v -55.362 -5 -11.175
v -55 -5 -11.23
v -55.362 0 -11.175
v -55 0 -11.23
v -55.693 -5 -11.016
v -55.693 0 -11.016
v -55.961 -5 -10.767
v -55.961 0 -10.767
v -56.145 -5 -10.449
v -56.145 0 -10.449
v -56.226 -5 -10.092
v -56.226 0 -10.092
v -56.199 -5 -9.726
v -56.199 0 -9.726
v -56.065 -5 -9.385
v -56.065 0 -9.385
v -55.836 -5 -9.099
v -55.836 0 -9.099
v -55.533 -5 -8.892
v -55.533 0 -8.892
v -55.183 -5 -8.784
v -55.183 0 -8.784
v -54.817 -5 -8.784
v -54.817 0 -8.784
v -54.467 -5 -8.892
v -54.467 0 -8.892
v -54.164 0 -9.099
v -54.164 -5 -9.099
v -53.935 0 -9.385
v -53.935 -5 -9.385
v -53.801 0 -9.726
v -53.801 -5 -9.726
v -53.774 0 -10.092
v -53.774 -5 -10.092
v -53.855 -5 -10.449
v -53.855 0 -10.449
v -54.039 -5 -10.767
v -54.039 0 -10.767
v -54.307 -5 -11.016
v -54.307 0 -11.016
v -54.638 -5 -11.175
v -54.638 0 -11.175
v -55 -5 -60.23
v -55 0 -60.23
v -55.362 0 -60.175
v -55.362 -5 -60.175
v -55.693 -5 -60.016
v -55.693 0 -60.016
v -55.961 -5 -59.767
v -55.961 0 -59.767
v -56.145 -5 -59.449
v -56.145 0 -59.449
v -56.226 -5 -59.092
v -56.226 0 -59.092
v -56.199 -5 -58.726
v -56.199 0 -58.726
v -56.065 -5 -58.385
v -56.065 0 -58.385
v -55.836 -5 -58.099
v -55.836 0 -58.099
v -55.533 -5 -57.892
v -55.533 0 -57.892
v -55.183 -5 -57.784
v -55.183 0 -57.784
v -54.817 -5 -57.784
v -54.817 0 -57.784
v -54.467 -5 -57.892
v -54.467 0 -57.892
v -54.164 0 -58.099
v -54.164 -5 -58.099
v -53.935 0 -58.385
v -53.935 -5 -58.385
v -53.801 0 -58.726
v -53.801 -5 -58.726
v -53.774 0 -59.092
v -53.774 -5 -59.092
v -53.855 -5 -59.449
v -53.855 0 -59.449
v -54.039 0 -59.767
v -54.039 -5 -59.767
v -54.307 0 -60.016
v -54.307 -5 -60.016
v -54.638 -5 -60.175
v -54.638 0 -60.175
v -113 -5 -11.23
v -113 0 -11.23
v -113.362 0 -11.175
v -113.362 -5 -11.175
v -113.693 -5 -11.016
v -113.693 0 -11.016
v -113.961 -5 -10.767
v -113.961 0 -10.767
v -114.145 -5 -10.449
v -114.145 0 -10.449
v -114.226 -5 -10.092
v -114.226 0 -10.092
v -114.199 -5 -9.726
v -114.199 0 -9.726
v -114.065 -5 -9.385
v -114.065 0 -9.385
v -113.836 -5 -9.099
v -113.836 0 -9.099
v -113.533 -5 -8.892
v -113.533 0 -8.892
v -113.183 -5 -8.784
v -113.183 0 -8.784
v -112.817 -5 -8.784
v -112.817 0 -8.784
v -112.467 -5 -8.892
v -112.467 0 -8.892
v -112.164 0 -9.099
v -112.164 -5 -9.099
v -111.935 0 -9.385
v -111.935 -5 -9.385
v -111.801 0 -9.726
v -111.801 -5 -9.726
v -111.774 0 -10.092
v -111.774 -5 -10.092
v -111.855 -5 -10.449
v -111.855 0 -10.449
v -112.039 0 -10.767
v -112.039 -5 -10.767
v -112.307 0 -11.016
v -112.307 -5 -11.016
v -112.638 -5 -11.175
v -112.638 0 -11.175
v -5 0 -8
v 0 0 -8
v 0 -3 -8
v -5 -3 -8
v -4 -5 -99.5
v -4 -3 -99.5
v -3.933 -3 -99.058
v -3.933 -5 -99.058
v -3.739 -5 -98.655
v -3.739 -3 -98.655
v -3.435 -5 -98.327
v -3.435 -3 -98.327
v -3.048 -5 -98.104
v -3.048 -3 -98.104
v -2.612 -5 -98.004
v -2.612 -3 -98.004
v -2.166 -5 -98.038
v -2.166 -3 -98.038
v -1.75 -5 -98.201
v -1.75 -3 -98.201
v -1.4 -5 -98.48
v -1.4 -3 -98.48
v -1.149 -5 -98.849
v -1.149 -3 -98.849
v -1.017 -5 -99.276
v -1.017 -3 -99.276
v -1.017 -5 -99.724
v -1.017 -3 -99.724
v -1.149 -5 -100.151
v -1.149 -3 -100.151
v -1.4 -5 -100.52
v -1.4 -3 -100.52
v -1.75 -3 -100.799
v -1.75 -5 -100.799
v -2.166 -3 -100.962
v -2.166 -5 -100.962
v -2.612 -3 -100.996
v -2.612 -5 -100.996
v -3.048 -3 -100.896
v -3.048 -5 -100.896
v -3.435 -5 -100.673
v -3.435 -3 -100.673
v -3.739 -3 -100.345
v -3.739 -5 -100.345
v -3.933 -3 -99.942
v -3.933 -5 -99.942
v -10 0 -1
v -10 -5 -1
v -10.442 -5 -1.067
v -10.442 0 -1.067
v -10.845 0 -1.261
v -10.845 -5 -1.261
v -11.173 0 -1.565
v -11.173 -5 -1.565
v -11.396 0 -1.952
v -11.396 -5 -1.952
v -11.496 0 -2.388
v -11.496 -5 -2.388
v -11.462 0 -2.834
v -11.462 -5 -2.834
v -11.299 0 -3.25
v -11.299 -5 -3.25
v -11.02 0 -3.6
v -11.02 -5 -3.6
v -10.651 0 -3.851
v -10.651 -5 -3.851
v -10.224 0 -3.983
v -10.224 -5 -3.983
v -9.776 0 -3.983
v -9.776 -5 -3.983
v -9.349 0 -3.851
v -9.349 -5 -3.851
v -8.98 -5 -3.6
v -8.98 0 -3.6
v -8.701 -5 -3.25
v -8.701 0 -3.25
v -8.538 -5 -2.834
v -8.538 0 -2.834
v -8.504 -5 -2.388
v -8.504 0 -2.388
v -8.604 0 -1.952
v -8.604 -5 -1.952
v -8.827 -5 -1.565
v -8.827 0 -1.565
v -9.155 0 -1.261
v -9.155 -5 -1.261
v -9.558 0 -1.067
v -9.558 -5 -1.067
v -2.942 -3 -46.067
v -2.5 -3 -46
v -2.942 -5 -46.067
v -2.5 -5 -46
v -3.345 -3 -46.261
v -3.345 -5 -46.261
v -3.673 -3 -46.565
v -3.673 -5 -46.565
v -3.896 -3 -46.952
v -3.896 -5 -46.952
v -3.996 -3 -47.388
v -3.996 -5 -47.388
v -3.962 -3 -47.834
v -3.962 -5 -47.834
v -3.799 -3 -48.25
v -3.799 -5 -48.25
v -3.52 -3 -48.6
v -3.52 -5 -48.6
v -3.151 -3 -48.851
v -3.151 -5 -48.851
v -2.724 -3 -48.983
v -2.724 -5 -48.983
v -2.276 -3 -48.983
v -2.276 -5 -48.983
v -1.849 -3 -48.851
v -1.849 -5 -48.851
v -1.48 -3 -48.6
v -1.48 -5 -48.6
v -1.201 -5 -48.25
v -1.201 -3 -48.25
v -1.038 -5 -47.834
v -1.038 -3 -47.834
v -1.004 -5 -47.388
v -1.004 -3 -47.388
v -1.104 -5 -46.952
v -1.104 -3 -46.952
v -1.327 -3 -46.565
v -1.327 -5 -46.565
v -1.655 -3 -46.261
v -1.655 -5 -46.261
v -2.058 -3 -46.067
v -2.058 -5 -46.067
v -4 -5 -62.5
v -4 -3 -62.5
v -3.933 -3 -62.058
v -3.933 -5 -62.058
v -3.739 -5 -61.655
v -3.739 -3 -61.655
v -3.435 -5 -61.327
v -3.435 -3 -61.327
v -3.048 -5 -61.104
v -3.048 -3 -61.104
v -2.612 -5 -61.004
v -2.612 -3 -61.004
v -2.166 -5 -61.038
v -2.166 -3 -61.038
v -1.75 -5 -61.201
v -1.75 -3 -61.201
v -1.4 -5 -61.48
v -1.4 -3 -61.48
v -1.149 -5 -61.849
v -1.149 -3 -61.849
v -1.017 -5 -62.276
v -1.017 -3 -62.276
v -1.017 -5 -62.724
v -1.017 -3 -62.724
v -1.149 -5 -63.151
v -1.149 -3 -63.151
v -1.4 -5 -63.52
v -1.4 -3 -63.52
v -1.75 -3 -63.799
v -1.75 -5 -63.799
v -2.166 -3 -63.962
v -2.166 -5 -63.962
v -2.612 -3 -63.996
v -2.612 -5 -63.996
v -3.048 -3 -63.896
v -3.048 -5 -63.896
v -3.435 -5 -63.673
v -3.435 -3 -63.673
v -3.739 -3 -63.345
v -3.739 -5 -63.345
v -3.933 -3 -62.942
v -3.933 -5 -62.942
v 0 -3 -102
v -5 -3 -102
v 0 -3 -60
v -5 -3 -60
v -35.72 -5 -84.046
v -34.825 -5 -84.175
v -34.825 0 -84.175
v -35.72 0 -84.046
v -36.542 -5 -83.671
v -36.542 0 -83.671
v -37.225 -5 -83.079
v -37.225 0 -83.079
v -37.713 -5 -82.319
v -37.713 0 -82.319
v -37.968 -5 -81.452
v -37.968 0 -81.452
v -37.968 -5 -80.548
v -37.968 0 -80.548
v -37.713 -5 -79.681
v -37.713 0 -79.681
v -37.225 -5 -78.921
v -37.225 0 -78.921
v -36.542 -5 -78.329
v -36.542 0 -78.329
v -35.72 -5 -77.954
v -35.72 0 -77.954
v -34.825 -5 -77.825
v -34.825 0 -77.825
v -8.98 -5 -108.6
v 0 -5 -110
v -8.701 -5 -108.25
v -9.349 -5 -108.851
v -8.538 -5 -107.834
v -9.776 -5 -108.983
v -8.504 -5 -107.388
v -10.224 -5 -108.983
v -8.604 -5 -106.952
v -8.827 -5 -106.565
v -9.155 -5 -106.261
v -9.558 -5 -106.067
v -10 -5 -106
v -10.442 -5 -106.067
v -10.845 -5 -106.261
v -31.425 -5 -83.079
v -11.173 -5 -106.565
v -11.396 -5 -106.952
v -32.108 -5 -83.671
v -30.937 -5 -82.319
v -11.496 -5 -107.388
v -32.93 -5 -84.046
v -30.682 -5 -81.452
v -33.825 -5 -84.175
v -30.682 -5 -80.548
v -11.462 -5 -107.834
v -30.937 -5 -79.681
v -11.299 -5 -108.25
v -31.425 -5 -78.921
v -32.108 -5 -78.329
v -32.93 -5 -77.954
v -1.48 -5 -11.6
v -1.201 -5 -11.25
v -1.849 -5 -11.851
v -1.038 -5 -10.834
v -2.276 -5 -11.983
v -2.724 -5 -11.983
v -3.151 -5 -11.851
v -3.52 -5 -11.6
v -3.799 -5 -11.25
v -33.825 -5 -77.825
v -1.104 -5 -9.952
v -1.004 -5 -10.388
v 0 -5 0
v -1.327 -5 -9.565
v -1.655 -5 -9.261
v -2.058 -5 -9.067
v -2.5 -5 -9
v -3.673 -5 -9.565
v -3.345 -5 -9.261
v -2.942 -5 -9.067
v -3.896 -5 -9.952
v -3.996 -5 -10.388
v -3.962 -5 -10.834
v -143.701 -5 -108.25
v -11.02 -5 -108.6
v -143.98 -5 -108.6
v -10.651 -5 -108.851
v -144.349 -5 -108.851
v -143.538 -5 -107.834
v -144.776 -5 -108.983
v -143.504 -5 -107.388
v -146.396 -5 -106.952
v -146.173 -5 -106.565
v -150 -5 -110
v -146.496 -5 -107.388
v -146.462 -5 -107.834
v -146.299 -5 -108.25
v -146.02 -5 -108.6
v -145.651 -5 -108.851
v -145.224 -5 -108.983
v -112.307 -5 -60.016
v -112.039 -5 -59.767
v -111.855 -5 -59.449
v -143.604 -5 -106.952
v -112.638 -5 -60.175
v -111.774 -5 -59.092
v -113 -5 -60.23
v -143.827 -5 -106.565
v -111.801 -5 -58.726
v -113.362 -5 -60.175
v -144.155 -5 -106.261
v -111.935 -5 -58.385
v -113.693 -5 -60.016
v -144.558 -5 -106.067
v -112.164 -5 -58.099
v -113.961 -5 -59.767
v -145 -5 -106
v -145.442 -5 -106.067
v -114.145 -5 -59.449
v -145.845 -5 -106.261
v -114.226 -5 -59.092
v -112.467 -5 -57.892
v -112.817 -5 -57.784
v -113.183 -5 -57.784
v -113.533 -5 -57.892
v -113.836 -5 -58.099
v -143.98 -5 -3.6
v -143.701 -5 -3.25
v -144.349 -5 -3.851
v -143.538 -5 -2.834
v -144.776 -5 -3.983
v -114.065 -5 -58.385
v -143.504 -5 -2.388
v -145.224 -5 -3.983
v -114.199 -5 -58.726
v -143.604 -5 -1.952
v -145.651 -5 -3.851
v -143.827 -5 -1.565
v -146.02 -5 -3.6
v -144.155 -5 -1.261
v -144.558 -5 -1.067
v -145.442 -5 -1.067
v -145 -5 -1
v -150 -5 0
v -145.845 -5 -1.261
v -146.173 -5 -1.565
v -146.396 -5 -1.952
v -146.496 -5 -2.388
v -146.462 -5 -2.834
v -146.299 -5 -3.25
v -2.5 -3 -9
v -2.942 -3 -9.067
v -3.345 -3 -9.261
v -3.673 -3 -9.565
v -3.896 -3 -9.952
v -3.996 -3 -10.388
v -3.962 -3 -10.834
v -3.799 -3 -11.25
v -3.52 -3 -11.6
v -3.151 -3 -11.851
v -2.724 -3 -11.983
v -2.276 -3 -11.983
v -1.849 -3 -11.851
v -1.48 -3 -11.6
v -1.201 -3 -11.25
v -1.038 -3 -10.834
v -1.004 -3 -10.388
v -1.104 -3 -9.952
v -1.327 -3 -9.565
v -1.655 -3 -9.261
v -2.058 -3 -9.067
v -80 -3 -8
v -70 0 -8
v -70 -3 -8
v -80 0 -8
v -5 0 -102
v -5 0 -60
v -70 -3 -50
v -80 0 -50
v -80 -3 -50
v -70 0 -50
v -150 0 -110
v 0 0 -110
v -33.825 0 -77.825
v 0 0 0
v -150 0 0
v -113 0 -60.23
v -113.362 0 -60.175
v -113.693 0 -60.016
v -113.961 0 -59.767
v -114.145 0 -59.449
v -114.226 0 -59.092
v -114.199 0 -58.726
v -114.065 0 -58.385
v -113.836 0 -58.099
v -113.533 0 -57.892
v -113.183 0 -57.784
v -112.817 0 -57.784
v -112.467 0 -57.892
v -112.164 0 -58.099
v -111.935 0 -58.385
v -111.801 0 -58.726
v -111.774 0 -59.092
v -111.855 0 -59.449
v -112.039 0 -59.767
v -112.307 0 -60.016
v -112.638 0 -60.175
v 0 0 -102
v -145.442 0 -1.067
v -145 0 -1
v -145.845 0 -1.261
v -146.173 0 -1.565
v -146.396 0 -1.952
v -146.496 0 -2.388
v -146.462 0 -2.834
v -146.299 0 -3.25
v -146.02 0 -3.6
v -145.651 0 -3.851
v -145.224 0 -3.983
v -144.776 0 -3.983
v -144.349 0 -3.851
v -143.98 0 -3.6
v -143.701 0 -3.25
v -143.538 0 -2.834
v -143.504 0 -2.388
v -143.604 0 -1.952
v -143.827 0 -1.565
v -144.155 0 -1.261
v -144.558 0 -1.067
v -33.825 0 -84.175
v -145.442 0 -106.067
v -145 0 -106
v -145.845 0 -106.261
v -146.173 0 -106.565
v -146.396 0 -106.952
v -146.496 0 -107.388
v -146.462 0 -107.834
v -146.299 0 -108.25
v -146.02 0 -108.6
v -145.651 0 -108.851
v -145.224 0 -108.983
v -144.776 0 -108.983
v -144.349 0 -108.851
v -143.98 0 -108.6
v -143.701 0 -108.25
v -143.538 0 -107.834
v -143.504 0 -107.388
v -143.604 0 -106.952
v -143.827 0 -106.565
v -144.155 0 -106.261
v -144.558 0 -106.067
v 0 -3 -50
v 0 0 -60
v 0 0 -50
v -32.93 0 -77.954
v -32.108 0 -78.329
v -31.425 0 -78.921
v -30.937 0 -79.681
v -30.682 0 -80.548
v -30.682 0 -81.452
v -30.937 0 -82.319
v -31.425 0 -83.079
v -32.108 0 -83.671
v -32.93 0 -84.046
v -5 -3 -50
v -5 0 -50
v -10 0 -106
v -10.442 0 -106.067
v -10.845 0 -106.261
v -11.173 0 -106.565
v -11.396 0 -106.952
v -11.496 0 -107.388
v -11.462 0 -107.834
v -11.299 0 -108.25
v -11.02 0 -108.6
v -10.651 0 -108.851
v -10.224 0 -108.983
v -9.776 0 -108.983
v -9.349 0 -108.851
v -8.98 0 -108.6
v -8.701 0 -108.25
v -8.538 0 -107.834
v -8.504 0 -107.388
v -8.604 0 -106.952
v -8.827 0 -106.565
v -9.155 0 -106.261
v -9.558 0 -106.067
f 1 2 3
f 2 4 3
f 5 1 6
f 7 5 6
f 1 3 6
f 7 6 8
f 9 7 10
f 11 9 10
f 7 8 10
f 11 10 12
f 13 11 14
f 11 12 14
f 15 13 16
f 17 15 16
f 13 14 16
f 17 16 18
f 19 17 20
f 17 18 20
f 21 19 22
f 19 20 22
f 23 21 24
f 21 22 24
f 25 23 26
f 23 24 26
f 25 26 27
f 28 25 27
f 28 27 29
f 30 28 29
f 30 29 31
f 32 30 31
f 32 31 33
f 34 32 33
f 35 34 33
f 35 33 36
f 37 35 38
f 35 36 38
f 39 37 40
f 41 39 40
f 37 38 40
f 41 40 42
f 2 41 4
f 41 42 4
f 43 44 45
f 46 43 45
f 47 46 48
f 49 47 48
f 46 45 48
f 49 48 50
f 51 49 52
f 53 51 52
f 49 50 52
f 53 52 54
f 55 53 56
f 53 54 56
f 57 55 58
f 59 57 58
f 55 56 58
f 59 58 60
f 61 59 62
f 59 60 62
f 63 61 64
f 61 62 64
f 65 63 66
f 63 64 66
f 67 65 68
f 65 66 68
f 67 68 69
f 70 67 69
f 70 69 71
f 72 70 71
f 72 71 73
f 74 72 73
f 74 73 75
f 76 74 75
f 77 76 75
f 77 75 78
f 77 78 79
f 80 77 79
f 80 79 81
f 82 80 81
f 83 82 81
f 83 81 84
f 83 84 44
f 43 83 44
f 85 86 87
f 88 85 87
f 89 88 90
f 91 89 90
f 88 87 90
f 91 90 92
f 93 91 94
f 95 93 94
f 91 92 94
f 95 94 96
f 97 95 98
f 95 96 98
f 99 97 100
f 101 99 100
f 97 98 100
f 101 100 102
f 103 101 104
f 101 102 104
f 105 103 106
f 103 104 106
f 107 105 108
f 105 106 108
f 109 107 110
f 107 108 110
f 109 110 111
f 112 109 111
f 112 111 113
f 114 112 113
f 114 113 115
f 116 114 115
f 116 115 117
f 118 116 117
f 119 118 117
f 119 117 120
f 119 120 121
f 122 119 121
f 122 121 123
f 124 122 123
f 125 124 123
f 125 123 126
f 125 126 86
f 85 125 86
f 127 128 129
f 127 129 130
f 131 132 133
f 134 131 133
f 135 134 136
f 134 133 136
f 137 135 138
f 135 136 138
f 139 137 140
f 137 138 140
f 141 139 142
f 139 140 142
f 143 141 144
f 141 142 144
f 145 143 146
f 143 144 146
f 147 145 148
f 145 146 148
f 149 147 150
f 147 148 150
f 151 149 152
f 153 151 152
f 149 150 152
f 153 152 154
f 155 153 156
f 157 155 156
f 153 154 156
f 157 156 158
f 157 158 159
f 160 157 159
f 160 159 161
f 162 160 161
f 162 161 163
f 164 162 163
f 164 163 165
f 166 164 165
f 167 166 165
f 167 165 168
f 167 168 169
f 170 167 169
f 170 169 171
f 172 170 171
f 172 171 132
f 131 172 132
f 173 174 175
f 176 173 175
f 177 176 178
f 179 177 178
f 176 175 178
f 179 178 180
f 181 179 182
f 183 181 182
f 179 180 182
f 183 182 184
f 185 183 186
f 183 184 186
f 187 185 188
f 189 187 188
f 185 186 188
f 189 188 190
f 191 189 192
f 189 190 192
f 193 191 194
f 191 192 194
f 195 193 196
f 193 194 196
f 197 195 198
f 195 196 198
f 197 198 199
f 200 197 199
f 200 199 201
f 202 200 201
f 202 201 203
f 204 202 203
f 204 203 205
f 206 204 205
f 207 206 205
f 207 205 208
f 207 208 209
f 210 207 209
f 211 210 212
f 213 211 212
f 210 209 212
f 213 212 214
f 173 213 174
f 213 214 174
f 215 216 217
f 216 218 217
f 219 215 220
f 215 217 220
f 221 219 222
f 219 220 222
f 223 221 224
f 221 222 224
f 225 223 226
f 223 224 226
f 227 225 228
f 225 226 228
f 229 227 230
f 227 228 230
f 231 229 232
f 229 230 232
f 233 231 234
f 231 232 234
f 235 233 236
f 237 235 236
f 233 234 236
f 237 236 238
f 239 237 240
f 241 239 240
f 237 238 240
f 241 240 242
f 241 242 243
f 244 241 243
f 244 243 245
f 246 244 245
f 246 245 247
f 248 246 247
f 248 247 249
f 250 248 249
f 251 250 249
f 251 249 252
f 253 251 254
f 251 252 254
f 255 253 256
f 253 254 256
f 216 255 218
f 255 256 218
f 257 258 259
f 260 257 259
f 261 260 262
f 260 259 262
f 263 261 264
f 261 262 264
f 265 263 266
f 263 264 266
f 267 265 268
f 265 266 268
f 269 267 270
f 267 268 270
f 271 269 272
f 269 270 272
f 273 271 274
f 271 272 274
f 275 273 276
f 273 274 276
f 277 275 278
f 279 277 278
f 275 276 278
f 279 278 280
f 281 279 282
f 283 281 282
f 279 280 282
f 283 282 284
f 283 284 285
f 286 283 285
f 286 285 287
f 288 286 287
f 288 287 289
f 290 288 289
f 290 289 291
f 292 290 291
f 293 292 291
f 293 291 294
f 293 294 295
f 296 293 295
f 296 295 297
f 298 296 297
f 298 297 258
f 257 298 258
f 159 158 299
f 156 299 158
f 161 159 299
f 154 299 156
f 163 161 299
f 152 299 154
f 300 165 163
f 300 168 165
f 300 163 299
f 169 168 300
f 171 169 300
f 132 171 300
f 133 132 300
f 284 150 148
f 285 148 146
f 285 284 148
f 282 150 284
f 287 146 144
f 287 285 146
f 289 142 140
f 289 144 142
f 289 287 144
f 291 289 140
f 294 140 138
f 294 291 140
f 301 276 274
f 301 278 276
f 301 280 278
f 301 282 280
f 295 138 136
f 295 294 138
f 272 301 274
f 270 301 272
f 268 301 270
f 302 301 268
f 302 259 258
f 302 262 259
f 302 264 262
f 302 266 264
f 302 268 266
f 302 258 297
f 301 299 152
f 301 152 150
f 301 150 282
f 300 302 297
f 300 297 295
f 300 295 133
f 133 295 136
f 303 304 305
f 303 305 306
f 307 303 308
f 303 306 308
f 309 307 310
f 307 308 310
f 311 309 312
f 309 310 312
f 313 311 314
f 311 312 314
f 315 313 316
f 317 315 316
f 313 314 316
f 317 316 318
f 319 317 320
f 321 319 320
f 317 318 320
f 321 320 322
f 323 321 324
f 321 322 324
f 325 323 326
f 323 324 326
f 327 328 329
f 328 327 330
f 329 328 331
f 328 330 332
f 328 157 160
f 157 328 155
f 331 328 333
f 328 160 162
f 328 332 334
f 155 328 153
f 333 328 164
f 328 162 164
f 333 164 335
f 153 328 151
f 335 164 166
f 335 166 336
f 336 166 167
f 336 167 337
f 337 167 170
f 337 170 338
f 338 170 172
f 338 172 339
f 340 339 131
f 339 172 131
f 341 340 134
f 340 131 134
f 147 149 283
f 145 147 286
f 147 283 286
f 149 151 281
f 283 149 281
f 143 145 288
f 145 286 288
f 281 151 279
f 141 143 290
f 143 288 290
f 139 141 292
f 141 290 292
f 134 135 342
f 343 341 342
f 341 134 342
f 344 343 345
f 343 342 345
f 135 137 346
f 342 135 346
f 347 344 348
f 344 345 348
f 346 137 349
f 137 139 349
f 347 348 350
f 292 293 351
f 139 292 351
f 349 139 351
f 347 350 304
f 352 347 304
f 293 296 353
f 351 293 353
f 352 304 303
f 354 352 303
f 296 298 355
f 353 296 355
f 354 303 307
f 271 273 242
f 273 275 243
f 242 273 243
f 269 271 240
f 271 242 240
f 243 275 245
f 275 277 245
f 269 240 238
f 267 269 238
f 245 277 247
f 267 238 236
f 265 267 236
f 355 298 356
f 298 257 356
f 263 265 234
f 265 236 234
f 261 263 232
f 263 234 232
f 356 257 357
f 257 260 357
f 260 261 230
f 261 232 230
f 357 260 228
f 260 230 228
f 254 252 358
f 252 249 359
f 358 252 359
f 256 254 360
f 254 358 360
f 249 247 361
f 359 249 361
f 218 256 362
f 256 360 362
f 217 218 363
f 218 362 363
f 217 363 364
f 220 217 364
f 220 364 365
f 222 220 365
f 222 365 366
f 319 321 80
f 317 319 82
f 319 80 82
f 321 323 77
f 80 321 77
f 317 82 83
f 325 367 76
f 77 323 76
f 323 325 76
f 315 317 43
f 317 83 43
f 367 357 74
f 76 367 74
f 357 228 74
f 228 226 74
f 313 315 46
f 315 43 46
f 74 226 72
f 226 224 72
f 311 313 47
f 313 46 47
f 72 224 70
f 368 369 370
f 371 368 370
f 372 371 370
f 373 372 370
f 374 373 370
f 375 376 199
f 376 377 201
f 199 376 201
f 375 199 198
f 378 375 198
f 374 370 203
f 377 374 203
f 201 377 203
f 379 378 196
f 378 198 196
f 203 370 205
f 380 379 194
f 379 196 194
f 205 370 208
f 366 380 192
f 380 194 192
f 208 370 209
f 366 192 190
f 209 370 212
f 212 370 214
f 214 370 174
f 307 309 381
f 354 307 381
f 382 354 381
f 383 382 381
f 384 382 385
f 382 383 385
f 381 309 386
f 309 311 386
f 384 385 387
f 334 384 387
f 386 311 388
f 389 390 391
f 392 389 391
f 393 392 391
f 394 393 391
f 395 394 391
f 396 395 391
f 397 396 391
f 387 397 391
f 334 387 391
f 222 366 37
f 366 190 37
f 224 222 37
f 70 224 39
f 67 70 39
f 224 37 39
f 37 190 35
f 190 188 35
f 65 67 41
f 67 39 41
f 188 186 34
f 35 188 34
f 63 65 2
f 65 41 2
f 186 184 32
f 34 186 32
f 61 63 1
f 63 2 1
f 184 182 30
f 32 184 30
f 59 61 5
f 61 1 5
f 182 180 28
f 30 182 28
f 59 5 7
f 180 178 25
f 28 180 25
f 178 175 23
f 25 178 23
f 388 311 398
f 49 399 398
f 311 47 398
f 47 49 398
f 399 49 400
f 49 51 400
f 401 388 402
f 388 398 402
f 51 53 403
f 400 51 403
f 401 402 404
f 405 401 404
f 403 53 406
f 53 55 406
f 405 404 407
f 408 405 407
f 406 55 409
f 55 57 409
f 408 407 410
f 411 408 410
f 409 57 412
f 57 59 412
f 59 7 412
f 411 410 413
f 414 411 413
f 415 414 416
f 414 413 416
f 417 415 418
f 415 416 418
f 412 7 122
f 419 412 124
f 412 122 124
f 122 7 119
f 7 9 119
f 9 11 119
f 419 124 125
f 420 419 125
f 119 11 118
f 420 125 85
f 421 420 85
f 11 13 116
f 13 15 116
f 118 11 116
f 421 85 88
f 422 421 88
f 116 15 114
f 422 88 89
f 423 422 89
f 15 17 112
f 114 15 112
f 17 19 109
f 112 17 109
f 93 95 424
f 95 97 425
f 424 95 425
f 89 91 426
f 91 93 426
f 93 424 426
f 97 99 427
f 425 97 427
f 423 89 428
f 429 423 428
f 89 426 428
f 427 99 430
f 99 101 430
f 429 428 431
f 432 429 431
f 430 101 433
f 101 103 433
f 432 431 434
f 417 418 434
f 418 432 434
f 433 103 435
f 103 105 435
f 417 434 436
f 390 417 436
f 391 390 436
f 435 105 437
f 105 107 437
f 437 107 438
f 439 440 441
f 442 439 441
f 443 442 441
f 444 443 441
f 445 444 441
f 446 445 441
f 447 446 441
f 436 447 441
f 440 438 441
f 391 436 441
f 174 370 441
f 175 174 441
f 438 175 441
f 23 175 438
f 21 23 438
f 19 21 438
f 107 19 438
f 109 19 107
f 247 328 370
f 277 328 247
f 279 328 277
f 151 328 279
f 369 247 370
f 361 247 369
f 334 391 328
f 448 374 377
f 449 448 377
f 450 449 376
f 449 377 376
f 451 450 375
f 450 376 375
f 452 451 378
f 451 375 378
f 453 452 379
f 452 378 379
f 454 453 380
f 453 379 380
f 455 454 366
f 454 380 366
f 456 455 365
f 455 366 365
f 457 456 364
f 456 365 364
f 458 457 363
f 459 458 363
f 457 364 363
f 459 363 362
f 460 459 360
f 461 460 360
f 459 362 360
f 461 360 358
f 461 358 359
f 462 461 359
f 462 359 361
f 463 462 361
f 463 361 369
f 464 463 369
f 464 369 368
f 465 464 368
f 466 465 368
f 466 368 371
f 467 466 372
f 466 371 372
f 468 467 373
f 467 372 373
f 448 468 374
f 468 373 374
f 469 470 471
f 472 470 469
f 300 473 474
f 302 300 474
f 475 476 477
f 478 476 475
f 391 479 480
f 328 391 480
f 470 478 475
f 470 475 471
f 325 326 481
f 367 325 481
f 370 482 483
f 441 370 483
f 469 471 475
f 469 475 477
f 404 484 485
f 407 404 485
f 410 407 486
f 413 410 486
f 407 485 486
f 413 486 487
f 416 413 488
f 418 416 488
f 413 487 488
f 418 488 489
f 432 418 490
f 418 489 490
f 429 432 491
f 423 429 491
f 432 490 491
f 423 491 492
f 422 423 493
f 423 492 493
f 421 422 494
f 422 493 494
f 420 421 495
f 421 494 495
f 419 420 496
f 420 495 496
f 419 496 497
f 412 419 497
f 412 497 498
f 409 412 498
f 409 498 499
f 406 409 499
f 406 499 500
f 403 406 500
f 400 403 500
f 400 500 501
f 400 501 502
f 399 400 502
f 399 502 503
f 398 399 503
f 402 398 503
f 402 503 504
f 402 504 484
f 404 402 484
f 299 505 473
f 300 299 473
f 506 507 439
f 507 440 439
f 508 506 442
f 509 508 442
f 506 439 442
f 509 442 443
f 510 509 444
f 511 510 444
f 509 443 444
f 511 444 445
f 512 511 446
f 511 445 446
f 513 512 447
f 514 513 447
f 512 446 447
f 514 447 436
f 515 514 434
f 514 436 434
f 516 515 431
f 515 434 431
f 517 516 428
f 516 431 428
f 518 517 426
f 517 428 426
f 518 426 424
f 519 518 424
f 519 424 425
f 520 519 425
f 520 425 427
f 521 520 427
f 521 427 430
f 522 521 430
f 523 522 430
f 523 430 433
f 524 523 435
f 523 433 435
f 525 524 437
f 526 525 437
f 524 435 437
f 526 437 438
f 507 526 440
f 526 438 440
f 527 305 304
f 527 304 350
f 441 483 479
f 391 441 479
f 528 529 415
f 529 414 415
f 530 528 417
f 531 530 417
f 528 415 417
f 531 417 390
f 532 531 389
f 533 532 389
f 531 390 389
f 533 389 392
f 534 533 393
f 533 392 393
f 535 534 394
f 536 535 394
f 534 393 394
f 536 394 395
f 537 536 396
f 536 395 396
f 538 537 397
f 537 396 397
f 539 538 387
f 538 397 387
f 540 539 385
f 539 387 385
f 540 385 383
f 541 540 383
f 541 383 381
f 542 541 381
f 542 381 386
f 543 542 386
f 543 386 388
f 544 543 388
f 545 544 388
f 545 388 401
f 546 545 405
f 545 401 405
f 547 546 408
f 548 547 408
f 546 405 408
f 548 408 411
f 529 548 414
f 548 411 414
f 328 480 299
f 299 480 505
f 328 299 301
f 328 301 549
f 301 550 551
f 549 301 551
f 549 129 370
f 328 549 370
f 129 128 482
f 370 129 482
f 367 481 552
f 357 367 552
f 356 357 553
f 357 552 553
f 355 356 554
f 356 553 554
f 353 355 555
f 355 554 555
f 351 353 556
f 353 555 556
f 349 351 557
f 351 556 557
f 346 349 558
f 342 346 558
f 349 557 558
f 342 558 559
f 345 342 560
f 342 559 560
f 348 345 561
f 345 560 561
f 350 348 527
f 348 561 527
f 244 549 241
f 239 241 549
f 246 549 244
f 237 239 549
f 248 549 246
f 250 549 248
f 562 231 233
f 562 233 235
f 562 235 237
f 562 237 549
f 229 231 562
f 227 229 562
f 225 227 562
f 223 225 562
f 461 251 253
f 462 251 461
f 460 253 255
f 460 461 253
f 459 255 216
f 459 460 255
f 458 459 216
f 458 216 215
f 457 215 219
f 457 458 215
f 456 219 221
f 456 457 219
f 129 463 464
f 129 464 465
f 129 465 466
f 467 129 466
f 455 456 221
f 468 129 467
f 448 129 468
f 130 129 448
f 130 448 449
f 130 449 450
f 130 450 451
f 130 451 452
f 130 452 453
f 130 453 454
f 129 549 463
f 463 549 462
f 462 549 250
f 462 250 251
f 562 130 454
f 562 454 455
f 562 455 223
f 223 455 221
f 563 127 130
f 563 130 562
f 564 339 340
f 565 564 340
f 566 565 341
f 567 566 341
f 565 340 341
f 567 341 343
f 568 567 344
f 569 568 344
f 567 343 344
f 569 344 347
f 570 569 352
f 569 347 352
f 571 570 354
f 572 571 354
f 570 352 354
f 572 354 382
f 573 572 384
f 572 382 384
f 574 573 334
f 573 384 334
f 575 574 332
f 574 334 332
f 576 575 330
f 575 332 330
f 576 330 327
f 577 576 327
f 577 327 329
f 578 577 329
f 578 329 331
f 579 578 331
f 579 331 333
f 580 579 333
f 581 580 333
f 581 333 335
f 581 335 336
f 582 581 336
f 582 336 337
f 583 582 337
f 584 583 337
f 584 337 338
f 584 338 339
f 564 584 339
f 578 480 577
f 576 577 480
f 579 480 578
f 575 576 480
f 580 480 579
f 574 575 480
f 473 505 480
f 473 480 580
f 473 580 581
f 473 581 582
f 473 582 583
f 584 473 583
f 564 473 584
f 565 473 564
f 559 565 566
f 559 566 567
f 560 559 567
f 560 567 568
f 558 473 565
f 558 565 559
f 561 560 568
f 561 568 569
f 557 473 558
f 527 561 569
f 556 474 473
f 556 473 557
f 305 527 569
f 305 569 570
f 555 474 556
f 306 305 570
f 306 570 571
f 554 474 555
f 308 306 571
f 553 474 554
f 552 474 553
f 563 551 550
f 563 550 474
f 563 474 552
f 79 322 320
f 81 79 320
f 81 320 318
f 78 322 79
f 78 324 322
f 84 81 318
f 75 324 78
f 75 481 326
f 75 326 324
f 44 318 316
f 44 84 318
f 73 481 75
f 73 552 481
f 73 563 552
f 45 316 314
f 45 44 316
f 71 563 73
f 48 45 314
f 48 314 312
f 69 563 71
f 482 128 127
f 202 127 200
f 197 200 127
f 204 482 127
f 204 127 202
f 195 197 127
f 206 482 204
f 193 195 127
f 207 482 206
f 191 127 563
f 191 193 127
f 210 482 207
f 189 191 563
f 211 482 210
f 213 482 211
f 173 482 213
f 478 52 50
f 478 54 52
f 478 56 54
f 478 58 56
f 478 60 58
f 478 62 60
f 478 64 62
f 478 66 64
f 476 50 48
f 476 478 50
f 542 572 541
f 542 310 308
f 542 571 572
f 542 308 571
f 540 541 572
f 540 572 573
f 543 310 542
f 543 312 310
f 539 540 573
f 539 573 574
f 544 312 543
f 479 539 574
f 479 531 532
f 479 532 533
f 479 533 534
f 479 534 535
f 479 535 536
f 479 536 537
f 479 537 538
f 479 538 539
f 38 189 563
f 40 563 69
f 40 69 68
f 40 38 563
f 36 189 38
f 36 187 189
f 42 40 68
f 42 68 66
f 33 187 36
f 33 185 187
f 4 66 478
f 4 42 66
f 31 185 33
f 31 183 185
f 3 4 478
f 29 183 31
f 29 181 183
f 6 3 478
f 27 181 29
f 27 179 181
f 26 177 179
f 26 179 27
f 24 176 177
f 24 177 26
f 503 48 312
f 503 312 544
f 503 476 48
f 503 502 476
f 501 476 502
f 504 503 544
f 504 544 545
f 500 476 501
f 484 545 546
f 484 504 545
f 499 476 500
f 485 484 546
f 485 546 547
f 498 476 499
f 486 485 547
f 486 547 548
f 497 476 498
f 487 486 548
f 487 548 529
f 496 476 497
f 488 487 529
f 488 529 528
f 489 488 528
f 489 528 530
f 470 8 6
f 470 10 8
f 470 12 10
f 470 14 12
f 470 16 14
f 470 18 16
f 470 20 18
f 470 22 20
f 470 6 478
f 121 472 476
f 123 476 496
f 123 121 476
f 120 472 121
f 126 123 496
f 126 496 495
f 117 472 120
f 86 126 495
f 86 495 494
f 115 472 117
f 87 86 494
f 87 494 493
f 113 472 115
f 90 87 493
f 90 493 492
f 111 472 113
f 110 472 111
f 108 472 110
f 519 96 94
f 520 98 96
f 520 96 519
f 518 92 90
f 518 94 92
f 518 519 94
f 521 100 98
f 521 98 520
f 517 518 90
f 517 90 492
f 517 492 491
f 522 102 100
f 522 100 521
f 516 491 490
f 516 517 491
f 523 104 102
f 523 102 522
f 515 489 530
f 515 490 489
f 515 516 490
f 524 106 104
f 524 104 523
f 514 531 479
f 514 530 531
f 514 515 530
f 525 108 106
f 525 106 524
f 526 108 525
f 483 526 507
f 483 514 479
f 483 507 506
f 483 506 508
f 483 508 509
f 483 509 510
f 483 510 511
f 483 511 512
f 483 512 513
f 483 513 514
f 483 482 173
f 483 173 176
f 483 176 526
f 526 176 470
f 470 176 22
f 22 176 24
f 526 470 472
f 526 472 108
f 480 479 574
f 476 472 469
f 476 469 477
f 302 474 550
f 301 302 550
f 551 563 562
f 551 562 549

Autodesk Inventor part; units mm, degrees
ref_plane "YZ Plane" through (0, 0, 0) normal (1, 0, 0) x (0, 1, 0)
ref_plane "XZ Plane" through (0, 0, 0) normal (0, 1, 0) x (-1, 0, 0)
ref_plane "XY Plane" through (0, 0, 0) normal (0, 0, 1) x (1, 0, 0)
sketch "Sketch1" plane through (0, 0, 0) normal (0, 1, 0) x (-1, 0, 0)
  line L0 (0, 0) -> (150, 0)
  line L1 (150, 0) -> (150, -110)
  line L2 (150, -110) -> (0, -110)
  line L3 (0, -110) -> (0, 0)
  line L4 (40, -60) -> (0, -60)
  line L5 (0, -60) -> (0, -102)
  line L6 (0, -102) -> (40, -102)
  line L7 (40, -102) -> (40, -60)
  circle A0 centre (2.5, -62.5) radius 1.5
  circle A1 centre (2.5, -99.5) radius 1.5
  circle A2 centre (34.825, -81) radius 3.175
  circle A3 centre (33.825, -81) radius 3.175
  line L8 (34.825, -77.825) -> (33.825, -77.825)
  line L9 (34.825, -84.175) -> (33.825, -84.175)
  line L10 (37, -77.825) -> (37, -84.175) construction
  line L11 (25, -96) -> (0, -96)
  line L12 (0, -96) -> (0, -66)
  line L13 (0, -66) -> (25, -66)
  line L14 (25, -66) -> (25, -96)
  line L15 (5, -102) -> (5, -96)
  line L16 (5, -66) -> (5, -60)
  line L17 (5, -50) -> (0, -50)
  line L18 (0, -50) -> (0, -8)
  line L19 (0, -8) -> (5, -8)
  line L20 (5, -8) -> (5, -50)
  line L21 (5, -96) -> (5, -66)
  line L22 (80, -50) -> (70, -50)
  line L23 (70, -50) -> (70, -8)
  line L24 (70, -8) -> (80, -8)
  line L25 (80, -8) -> (80, -50)
  point P0 (0, -81)
  point P1 (40, -81)
  point P2 (0, -60)
  point P3 (25, -81)
  point P4 (5, -99)
  point P5 (0, -66)
  point P6 (0, -96)
  point P7 (0, -50)
  point P8 (70, -29)
  point P9 (5, -29)
  dimension "d0" = 110
  dimension "d3" = 42
  dimension "d6" = 40
  dimension "d13" = 3
  dimension "d14" = 3
  dimension "d18" = 2.5
  dimension "d19" = 2.5
  dimension "d20" = 2.5
  dimension "d21" = 2.5
  dimension "d22" = 6.35
  dimension "d23" = 1
  dimension "d26" = 37
  dimension "d29" = 25
  dimension "d30" = 30
  dimension "d31" = 5
  dimension "d32" = 150
  dimension "d33" = 8
  dimension "d34" = 42
  dimension "d35" = 5
  dimension "d36" = 8
  dimension "d73" = 10
  dimension "d74" = 42
  dimension "d75" = 70
extrude "Extrusion1" add sketch "Sketch1" against normal blind 5 contours L0 L1 L2 L3 L6 L7 L4 L17 L20 L19 | L19 L20 L17 L3 | L4 L16 L13 L3 | L3 L11 L15 L6 | L13 L21 L11 L3 | L4 L7 L6 L15 L11 L14 L13 L16 | L13 L14 L11 L21 | A0 | A1 | A2 A3 | A2 A3 L8 | L9 A3 A2 | A3 A2 | A2 A3 | L22 L23 L24 L25
extrude "Extrusion2" cut sketch "Sketch1" against normal blind 5 contours A0 | A1 | A2 A3 | A2 A3 L8 | L9 A3 A2 | A3 A2 | A2 A3
extrude "Extrusion3" cut sketch "Sketch1" against normal blind 3 contours L19 L20 L17 L3 | L4 L16 L13 L3 | L3 L11 L15 L6 | L13 L21 L11 L3 | L22 L23 L24 L25
sketch "Sketch2" plane through (0, -3, 0) normal (0, 1, 0) x (1, 0, 0)
  line L0 (-5, 50) -> (0, 50) projected
  line L1 (0, 50) -> (0, 8) projected
  line L2 (0, 8) -> (-5, 8) projected
  point P0 (0, 0)
  point P1 (-2.5, 47.5)
  point P2 (-2.5, 10.5)
  dimension "d44" = 2.5
  dimension "d45" = 2.5
  dimension "d46" = 2.5
  dimension "d47" = 2.5
hole "Hole1" at (-2.5, -3, -47.5) at (-2.5, -3, -10.5) direction (0, -1, 0) diameter 3 end through all
sketch "Sketch3" plane through (0, 0, 0) normal (0, 1, 0) x (1, 0, 0)
  line L0 (0, 0) -> (0, 8) projected
  line L1 (-150, 0) -> (0, 0) projected
  line L2 (0, 110) -> (-150, 110) projected
  line L3 (0, 102) -> (0, 110) projected
  point P0 (-10, 2.5)
  point P1 (-10, 107.5)
  dimension "d55" = 10
  dimension "d56" = 2.5
  dimension "d57" = 2.5
  dimension "d58" = 10
hole "Hole2" at (-10, 0, -2.5) at (-10, 0, -107.5) direction (0, -1, 0) diameter 3 depth 6 tip angle 118
pattern_linear "Rectangular Pattern1" count 2 spacing 135 along (-1, 0, 0) of "Hole2"
sketch "Sketch4" plane through (0, -5, 0) normal (0, -1, 0) x (1, 0, 0)
  line L0 (-113, -10) -> (-55, -10) construction
  line L1 (-55, -10) -> (-55, -59) construction
  line L2 (-55, -59) -> (-113, -59) construction
  line L3 (-113, -59) -> (-113, -10) construction
  line L4 (0, 0) -> (-150, 0) construction
  line L5 (0, -110) -> (0, 0) construction
  dimension "d69" = 58
  dimension "d70" = 49
  dimension "d71" = 10
  dimension "d72" = 55
hole "Hole3" at (-113, -5, -10) at (-55, -5, -10) at (-55, -5, -59) at (-113, -5, -59) direction (0, 1, 0) diameter 2.459 end through all thread size "M3x0.5" class "6H" standard "ISO Metric profile"
properties part number "Camera plate" material "Aluminum 6061"
